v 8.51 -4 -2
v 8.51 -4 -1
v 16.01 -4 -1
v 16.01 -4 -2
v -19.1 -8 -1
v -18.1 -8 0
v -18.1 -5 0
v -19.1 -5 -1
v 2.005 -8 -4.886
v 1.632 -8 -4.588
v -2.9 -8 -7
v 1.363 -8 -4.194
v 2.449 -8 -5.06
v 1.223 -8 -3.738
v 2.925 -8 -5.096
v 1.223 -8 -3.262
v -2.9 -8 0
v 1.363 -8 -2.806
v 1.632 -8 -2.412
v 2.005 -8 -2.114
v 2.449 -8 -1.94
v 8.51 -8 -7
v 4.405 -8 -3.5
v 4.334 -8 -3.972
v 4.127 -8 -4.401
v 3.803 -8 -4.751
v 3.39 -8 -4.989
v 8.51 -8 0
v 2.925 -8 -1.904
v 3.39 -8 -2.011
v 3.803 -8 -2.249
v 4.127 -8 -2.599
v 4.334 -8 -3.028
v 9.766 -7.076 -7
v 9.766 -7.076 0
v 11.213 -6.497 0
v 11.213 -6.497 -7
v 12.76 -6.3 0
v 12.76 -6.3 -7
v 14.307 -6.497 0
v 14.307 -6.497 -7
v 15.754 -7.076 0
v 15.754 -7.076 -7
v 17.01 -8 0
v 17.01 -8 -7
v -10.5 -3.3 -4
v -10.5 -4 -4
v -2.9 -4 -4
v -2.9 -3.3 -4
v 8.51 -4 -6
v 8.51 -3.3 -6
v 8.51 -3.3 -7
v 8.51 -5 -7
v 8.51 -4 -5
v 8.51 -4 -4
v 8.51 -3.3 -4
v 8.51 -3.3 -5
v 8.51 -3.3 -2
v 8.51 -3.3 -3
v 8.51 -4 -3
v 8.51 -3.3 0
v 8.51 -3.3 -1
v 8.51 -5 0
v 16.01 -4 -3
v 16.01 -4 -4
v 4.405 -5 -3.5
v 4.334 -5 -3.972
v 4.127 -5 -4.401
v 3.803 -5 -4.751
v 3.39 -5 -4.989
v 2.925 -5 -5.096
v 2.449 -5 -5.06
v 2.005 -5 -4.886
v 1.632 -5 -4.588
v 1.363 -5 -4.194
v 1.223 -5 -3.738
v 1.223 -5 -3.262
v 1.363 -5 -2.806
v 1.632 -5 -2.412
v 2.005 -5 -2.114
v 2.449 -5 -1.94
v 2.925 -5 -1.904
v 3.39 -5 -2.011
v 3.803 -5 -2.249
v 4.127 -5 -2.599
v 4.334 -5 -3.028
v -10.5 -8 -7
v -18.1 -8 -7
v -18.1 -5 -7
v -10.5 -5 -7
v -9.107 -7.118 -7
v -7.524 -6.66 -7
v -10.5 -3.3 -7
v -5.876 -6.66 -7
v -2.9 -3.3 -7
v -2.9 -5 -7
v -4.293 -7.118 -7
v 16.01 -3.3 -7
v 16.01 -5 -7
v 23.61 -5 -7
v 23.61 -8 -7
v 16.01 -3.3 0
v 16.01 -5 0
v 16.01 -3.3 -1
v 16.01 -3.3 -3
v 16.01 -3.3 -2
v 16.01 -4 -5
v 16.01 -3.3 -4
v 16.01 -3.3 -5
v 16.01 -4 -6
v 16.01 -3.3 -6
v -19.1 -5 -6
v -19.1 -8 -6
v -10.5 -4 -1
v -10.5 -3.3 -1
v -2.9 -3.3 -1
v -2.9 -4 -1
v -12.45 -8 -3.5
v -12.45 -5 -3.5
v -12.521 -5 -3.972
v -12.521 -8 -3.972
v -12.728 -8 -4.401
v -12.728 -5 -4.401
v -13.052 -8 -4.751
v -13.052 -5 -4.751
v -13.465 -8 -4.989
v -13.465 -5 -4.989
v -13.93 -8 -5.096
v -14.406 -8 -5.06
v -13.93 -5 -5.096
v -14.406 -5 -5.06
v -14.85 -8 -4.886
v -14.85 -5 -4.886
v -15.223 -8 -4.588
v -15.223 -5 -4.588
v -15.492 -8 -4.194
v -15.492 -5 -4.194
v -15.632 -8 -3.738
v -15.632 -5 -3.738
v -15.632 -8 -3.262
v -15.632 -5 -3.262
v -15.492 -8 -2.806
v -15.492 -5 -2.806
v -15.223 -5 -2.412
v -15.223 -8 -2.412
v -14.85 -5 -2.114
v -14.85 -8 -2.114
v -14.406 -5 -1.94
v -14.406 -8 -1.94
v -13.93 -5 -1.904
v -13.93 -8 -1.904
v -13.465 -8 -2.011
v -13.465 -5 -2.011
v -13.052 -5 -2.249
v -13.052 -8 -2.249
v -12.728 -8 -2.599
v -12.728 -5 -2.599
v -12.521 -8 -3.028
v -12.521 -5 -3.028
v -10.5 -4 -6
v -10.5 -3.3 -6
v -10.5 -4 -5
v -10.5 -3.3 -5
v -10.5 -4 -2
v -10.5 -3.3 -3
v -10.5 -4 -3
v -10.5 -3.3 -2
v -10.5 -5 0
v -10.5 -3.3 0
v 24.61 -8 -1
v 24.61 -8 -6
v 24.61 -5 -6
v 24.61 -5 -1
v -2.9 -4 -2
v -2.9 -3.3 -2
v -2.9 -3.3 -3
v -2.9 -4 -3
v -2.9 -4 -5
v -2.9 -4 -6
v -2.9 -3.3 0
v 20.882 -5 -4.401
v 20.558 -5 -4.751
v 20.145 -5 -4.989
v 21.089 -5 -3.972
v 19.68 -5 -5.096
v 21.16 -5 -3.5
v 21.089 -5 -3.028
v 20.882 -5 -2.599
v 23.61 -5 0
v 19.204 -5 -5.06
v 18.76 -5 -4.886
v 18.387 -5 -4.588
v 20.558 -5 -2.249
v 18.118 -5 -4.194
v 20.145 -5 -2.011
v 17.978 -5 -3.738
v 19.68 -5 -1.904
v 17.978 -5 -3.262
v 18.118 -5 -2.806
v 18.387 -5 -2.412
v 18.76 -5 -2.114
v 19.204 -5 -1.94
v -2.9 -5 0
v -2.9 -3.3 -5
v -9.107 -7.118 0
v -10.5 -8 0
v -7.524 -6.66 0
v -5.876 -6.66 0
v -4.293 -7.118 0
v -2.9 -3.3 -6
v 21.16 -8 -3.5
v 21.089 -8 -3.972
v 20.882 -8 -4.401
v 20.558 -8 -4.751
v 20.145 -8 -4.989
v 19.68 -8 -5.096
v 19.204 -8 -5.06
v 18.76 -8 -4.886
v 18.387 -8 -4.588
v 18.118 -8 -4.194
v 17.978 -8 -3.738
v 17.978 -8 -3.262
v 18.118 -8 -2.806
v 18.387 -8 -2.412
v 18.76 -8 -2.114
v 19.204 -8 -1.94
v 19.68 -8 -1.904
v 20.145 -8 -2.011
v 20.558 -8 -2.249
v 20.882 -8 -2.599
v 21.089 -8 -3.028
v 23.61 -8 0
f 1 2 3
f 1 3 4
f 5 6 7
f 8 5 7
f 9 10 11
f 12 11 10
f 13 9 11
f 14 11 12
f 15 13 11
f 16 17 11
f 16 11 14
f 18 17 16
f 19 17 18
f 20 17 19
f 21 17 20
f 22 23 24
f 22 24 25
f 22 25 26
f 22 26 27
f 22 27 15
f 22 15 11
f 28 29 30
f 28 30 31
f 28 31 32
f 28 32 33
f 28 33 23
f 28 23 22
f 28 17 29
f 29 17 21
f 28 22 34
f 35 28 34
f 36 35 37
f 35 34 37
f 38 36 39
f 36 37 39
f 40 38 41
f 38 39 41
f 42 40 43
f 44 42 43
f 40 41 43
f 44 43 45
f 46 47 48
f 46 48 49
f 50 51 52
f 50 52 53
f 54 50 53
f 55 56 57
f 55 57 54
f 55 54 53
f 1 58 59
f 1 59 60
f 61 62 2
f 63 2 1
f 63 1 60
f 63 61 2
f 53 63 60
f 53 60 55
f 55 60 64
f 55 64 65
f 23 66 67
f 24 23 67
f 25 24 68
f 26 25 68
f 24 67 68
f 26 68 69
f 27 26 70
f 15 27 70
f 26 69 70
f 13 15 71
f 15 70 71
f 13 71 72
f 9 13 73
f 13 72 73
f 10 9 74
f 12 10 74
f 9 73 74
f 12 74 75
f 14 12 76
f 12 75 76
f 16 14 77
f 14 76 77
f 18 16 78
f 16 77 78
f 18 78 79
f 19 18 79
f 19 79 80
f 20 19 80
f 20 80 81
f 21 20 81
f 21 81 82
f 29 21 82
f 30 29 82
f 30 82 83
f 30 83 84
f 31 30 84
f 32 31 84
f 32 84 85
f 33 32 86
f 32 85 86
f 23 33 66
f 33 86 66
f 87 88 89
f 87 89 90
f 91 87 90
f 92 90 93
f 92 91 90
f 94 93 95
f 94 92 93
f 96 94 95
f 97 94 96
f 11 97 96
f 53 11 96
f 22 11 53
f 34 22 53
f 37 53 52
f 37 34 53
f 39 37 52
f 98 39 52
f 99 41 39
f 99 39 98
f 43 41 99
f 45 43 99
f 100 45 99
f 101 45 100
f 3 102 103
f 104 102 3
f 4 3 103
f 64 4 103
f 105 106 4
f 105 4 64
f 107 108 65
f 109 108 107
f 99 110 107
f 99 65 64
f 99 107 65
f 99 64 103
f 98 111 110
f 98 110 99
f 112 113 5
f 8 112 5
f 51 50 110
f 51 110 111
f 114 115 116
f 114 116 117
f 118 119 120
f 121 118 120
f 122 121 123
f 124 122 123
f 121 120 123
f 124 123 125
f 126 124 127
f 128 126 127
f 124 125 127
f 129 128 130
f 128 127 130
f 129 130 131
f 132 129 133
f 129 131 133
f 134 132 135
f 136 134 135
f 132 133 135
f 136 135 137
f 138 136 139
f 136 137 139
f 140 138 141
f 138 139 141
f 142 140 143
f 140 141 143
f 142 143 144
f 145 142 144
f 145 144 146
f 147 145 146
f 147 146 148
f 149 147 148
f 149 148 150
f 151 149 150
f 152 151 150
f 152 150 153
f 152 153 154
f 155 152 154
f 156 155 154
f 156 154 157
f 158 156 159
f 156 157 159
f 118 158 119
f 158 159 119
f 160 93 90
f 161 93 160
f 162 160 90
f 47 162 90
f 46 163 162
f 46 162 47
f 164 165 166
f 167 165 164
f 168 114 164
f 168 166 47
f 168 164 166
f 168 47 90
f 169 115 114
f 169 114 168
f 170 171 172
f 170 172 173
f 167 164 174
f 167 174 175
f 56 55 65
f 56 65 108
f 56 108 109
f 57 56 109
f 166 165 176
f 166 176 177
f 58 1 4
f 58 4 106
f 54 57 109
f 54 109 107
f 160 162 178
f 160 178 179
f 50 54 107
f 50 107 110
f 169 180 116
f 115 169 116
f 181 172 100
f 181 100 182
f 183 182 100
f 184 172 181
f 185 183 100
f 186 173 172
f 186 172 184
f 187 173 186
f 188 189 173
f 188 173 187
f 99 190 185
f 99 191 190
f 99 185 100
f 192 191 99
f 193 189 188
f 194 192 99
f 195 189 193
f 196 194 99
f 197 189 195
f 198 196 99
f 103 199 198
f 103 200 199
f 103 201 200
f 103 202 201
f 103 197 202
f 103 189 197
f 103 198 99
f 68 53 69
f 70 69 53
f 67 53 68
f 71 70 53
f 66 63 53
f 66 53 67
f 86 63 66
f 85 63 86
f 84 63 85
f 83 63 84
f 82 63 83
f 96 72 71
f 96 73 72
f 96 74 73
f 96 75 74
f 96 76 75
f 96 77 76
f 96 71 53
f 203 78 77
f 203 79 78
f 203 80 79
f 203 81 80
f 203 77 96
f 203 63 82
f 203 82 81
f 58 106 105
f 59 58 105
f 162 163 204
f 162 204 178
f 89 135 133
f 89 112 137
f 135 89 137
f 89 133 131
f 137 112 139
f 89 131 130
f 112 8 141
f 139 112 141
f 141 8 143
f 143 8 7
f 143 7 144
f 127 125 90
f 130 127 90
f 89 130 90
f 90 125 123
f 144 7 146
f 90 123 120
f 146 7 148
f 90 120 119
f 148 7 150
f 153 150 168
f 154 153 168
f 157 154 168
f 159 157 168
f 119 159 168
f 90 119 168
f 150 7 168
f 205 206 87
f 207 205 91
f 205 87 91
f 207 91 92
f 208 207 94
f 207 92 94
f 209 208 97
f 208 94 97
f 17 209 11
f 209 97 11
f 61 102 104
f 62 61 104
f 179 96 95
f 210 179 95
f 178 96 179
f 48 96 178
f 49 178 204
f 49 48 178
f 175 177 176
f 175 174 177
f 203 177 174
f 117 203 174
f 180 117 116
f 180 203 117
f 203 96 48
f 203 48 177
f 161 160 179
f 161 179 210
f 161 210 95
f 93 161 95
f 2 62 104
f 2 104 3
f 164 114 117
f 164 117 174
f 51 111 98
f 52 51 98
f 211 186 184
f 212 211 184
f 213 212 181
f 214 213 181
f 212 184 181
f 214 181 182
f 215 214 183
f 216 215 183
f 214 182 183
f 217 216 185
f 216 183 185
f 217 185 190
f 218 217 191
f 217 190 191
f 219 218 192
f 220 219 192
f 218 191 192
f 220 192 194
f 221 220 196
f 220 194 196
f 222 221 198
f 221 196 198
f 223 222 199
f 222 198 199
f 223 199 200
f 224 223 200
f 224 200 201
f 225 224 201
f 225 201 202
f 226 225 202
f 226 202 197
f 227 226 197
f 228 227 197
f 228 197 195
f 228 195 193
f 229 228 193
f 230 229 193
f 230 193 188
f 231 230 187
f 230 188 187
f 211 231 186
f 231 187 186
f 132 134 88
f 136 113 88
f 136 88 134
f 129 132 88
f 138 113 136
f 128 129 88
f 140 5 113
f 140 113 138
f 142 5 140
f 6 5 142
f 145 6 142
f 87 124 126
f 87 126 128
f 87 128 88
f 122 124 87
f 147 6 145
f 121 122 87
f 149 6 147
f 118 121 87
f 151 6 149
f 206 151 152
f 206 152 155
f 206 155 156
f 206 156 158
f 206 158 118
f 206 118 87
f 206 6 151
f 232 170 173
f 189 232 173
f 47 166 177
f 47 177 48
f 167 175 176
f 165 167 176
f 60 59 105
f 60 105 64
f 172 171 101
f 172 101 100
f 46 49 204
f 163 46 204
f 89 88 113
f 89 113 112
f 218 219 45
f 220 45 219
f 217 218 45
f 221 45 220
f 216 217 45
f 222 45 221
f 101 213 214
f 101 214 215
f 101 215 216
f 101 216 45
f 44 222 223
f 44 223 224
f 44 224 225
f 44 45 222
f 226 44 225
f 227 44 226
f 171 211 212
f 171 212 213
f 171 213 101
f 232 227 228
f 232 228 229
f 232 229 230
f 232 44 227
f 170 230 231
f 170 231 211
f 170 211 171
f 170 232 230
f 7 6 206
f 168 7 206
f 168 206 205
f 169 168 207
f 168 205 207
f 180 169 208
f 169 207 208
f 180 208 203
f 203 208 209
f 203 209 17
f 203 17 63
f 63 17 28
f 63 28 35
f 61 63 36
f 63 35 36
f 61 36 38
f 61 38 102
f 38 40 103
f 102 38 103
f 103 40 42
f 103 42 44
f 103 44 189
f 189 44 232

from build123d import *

# Parameters (mm, degrees)
BOSS_EXTRUDE1_DEPTH = 7
CUT_EXTRUDE1_DEPTH  = 28.51
SKETCH4_R           = 1.6
CUT_EXTRUDE2_DEPTH  = 3
SKETCH5_R           = 1.6
CUT_EXTRUDE3_DEPTH  = 3
SKETCH6_W           = 7
SKETCH6_H           = 0.3
CUT_EXTRUDE4_DEPTH  = 28.51
SKETCH8_W           = 7
SKETCH8_H           = 1.7
CUT_EXTRUDE6_DEPTH  = 1
SKETCH9_W           = 2.5
SKETCH9_H           = 7
BOSS_EXTRUDE2_DEPTH = 3
CUT_EXTRUDE7_DEPTH  = 7
CHAMFER1_SIZE       = 1
SKETCH11_W          = 7
SKETCH11_H          = 1.7
CUT_EXTRUDE8_DEPTH  = 1


with BuildPart() as part:
    # Sketch1 → Boss-Extrude1 (new body)
    with BuildSketch(Plane.XY):
        Polygon((17.01, -5), (17.01, -3), (8.51, -3), (8.51, -5), (8.41, -5), (-2.8, -5), (-2.9, -5), (-2.9, -3), (-11.5, -3), (-11.5, -5), (-11.6, -5), (-16.6, -5), (-16.6, -8), (22.11, -8), (22.11, -5), (17.11, -5), align=None)
    extrude(amount=-BOSS_EXTRUDE1_DEPTH)

    # Sketch2 → Cut-Extrude1 (cut)
    with BuildSketch(Plane.ZY.offset(11.5)):
        Polygon((0, -3), (-1, -3), (-1, -4), (-2, -4), (-2, -3), (-3, -3), (-3, -4), (-4, -4), (-4, -3), (-5, -3), (-5, -4), (-6, -4), (-6, -3), (-7, -3), (-7, -2.645827001), (0, -2.645827001), align=None)
    extrude(amount=-CUT_EXTRUDE1_DEPTH, mode=Mode.SUBTRACT)

    # Sketch4 → Cut-Extrude2 (cut)
    with BuildSketch(Plane(origin=(0, -5, 0), x_dir=(1, 0, 0), z_dir=(0, 1, 0))):
        with Locations((2.805, 3.5)):
            Circle(SKETCH4_R)
    extrude(amount=-CUT_EXTRUDE2_DEPTH, mode=Mode.SUBTRACT)

    # Sketch5 → Cut-Extrude3 (cut)
    with BuildSketch(Plane(origin=(0, -5, 0), x_dir=(1, 0, 0), z_dir=(0, 1, 0))):
        with Locations((-14.05, 3.5)):
            Circle(SKETCH5_R)
        with Locations((19.56, 3.5)):
            Circle(SKETCH5_R)
    extrude(amount=-CUT_EXTRUDE3_DEPTH, mode=Mode.SUBTRACT)

    # Sketch6 → Cut-Extrude4 (cut)
    with BuildSketch(Plane(origin=(17.01, 0, 0), x_dir=(0, 0, -1), z_dir=(1, 0, 0))):
        with Locations((3.5, -3.15)):
            Rectangle(SKETCH6_W, SKETCH6_H)
    extrude(amount=-CUT_EXTRUDE4_DEPTH, mode=Mode.SUBTRACT)

    # Sketch8 → Cut-Extrude6 (cut)
    with BuildSketch(Plane.ZY.offset(11.5)):
        with Locations((-3.5, -4.15)):
            Rectangle(SKETCH8_W, SKETCH8_H)
    extrude(amount=-CUT_EXTRUDE6_DEPTH, mode=Mode.SUBTRACT)

    # Sketch9 → Boss-Extrude2 (add)
    with BuildSketch(Plane.XZ.offset(8)):
        with Locations((-17.85, -3.5)):
            Rectangle(SKETCH9_W, SKETCH9_H)
        with Locations((23.36, -3.5)):
            Rectangle(SKETCH9_W, SKETCH9_H)
    extrude(amount=-BOSS_EXTRUDE2_DEPTH)

    # Sketch10 → Cut-Extrude7 (cut)
    with BuildSketch(Plane(origin=(0, 0, -7), x_dir=(-1, 0, 0), z_dir=(0, 0, -1))):
        with BuildLine():
            Line((-17.01, -8), (-8.51, -8))
            ThreePointArc((-8.51, -8), (-12.76, -6.3), (-17.01, -8))
        make_face()
        with BuildLine():
            Line((2.9, -8), (10.5, -8))
            ThreePointArc((10.5, -8), (6.7, -6.601279457), (2.9, -8))
        make_face()
    extrude(amount=-CUT_EXTRUDE7_DEPTH, mode=Mode.SUBTRACT)

    # Chamfer1
    chamfer1_edges = [part.edges().sort_by_distance(p)[0] for p in [
        (-19.1, -6.5, -7),
        (-19.1, -6.5, 0),
        (24.61, -6.5, 0),
        (24.61, -6.5, -7),
    ]]
    chamfer(chamfer1_edges, length=CHAMFER1_SIZE)

    # Sketch11 → Cut-Extrude8 (cut)
    with BuildSketch(Plane(origin=(17.01, 0, 0), x_dir=(0, 0, -1), z_dir=(1, 0, 0))):
        with Locations((3.5, -4.15)):
            Rectangle(SKETCH11_W, SKETCH11_H)
    extrude(amount=-CUT_EXTRUDE8_DEPTH, mode=Mode.SUBTRACT)


solid = part.part
